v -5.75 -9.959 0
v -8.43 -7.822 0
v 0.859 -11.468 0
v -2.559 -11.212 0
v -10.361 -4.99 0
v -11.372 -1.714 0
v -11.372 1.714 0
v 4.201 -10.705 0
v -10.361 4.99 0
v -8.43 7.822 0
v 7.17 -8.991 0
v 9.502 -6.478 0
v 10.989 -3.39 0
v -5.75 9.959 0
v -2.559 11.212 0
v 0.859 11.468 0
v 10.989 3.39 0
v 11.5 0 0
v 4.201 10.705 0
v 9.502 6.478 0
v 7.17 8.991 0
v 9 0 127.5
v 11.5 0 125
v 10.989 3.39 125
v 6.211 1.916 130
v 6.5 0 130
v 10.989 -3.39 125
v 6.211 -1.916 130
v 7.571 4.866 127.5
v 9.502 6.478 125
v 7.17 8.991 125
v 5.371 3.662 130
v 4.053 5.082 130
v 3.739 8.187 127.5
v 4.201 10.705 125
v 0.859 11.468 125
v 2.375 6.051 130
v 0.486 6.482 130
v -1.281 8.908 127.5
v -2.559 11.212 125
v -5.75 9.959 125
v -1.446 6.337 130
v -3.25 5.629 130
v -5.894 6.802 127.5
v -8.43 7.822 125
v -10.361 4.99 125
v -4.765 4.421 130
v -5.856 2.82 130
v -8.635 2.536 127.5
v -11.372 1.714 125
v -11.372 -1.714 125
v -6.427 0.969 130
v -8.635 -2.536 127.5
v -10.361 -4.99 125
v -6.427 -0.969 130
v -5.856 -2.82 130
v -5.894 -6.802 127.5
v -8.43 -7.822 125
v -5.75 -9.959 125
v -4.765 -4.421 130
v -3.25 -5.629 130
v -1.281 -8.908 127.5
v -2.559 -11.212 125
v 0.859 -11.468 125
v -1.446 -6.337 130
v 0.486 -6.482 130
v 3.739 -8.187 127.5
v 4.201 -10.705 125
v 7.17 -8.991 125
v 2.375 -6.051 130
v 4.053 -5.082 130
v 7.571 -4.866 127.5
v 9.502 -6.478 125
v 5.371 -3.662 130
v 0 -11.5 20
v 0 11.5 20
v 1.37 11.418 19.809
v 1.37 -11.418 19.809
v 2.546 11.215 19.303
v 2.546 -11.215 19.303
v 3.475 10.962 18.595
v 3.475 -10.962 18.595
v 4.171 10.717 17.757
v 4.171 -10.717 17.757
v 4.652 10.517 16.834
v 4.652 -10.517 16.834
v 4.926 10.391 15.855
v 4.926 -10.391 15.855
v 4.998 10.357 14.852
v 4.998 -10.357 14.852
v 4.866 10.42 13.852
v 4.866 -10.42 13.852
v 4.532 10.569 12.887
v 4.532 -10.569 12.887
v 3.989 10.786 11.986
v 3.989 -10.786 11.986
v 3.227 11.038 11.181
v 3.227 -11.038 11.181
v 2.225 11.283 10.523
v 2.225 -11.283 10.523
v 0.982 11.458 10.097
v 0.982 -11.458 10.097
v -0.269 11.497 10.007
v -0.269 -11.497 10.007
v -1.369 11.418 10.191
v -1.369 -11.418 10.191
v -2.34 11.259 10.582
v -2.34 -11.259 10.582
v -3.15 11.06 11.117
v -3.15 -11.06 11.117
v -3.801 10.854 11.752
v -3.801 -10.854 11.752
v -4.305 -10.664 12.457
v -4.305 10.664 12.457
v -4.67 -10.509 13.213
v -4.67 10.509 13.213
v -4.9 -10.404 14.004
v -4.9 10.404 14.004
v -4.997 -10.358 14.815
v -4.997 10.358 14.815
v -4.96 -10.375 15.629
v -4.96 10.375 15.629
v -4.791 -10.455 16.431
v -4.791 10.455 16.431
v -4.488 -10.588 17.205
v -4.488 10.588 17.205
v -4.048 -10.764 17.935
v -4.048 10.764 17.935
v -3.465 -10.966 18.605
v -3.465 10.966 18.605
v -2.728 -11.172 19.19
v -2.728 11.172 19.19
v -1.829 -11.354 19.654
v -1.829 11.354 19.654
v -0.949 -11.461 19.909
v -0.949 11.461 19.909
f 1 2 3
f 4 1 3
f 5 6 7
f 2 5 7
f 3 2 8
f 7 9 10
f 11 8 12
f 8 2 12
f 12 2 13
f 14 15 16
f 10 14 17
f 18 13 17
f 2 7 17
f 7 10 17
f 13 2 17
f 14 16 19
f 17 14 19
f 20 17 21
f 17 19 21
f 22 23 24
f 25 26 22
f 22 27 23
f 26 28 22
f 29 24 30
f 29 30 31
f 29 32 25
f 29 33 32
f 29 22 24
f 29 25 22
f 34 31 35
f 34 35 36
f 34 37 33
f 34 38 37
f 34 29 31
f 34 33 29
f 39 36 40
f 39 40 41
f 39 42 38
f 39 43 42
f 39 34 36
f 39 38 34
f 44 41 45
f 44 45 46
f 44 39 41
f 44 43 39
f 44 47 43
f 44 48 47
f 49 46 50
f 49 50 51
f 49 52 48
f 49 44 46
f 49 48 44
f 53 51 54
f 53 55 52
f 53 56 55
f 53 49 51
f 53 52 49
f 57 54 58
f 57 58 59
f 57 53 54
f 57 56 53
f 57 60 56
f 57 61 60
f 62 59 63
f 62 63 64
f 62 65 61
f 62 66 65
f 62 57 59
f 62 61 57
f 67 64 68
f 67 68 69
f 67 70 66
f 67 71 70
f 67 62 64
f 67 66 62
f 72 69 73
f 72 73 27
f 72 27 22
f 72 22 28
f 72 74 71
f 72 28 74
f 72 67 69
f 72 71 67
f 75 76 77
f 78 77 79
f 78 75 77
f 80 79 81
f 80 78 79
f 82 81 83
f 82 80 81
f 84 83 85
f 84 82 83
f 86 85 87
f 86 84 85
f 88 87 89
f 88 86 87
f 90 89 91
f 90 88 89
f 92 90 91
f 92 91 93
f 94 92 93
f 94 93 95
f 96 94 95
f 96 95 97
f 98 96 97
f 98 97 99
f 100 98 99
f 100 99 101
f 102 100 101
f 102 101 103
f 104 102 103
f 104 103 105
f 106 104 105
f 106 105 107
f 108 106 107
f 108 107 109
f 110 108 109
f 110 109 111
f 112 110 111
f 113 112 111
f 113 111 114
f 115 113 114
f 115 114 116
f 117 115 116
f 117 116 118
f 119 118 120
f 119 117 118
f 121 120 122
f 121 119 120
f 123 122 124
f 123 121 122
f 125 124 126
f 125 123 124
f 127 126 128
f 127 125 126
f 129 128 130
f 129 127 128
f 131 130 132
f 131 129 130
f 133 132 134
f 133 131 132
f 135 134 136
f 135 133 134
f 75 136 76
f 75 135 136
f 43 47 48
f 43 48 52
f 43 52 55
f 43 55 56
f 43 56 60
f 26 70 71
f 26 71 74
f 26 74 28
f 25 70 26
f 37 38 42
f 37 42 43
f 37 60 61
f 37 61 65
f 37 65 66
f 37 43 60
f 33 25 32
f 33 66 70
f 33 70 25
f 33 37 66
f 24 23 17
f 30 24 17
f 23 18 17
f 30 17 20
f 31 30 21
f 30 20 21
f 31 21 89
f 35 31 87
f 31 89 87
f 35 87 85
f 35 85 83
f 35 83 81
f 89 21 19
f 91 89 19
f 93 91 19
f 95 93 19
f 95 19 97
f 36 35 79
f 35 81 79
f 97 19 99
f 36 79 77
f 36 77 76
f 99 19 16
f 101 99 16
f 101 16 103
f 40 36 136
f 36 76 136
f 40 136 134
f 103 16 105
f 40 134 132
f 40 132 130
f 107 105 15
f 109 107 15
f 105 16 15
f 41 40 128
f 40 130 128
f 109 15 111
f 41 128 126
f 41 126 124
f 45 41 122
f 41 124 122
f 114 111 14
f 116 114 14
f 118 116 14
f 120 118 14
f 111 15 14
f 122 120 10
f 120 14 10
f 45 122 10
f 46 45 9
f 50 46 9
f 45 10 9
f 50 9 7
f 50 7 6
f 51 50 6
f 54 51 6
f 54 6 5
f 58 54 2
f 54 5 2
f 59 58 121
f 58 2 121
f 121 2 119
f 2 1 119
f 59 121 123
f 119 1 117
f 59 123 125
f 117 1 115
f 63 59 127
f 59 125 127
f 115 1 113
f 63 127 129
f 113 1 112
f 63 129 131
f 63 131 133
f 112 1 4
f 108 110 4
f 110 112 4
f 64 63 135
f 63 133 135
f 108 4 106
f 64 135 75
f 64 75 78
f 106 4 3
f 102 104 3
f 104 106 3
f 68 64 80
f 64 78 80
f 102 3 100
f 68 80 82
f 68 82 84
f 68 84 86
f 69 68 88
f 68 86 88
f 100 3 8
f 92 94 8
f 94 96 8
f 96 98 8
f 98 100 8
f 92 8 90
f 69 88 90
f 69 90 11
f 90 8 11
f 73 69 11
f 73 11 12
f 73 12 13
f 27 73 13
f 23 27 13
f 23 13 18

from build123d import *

# Parameters (mm, degrees)
SKETCH1_R               = 11.5
BOSS_EXTRUDE1_DEPTH     = 130
CHAMFER1_SIZE           = 5
CUT_EXTRUDE1_DEPTH      = 132.013358098
CUT_EXTRUDE1_DEPTH_BACK = 132.013358098
SKETCH2_R               = 5


with BuildPart() as part:
    # Sketch1 → Boss-Extrude1 (new body)
    with BuildSketch(Plane.XY):
        Circle(SKETCH1_R)
    extrude(amount=BOSS_EXTRUDE1_DEPTH)

    # Chamfer1
    chamfer1_edges = [part.edges().sort_by_distance(p)[0] for p in [
        (-11.5, 0, 130),
    ]]
    chamfer(chamfer1_edges, length=CHAMFER1_SIZE)

    # Sketch2 → Cut-Extrude1 (cut, two sides: drawn at the far end of the back side and taken through both)
    with BuildSketch(Plane(origin=(0, 0, 0), x_dir=(1, 0, 0), z_dir=(0, 1, 0)).offset(-CUT_EXTRUDE1_DEPTH_BACK)):
        with Locations(Location((0, -15, 0), (0, 0, 270))):
            Circle(SKETCH2_R)
    extrude(amount=CUT_EXTRUDE1_DEPTH + CUT_EXTRUDE1_DEPTH_BACK, mode=Mode.SUBTRACT)


solid = part.part
